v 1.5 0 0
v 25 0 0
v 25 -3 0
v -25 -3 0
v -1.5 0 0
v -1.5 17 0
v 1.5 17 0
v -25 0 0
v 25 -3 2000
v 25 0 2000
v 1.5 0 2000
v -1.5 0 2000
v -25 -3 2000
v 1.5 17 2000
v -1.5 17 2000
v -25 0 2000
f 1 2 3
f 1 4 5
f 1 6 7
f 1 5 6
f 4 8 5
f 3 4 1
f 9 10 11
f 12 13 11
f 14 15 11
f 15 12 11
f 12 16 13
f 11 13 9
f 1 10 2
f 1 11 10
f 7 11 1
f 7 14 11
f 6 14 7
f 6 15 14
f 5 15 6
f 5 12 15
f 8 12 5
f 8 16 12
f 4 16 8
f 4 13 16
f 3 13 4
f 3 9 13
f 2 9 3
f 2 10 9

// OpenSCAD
/*
      
      |
      |         b
      |
-----------
      a
      
 material_thickness = c
*/

module simple_profile_T(a,b,c, length) {
    translate([-a/2,-c,0])
    linear_extrude( height = length ) {
        polygon(
            points = [
                [0,0],
                [a,0],
                [a,c],
                [a/2+c/2,c],
                [a/2+c/2,b],
                [a/2-c/2,b],
                [a/2-c/2,c],
                [0,c]
            ],
            paths = [
                [0,1,2,3,4,5,6,7],
            ]
        );
    }
}

simple_profile_T(50,20,3, 2000);
